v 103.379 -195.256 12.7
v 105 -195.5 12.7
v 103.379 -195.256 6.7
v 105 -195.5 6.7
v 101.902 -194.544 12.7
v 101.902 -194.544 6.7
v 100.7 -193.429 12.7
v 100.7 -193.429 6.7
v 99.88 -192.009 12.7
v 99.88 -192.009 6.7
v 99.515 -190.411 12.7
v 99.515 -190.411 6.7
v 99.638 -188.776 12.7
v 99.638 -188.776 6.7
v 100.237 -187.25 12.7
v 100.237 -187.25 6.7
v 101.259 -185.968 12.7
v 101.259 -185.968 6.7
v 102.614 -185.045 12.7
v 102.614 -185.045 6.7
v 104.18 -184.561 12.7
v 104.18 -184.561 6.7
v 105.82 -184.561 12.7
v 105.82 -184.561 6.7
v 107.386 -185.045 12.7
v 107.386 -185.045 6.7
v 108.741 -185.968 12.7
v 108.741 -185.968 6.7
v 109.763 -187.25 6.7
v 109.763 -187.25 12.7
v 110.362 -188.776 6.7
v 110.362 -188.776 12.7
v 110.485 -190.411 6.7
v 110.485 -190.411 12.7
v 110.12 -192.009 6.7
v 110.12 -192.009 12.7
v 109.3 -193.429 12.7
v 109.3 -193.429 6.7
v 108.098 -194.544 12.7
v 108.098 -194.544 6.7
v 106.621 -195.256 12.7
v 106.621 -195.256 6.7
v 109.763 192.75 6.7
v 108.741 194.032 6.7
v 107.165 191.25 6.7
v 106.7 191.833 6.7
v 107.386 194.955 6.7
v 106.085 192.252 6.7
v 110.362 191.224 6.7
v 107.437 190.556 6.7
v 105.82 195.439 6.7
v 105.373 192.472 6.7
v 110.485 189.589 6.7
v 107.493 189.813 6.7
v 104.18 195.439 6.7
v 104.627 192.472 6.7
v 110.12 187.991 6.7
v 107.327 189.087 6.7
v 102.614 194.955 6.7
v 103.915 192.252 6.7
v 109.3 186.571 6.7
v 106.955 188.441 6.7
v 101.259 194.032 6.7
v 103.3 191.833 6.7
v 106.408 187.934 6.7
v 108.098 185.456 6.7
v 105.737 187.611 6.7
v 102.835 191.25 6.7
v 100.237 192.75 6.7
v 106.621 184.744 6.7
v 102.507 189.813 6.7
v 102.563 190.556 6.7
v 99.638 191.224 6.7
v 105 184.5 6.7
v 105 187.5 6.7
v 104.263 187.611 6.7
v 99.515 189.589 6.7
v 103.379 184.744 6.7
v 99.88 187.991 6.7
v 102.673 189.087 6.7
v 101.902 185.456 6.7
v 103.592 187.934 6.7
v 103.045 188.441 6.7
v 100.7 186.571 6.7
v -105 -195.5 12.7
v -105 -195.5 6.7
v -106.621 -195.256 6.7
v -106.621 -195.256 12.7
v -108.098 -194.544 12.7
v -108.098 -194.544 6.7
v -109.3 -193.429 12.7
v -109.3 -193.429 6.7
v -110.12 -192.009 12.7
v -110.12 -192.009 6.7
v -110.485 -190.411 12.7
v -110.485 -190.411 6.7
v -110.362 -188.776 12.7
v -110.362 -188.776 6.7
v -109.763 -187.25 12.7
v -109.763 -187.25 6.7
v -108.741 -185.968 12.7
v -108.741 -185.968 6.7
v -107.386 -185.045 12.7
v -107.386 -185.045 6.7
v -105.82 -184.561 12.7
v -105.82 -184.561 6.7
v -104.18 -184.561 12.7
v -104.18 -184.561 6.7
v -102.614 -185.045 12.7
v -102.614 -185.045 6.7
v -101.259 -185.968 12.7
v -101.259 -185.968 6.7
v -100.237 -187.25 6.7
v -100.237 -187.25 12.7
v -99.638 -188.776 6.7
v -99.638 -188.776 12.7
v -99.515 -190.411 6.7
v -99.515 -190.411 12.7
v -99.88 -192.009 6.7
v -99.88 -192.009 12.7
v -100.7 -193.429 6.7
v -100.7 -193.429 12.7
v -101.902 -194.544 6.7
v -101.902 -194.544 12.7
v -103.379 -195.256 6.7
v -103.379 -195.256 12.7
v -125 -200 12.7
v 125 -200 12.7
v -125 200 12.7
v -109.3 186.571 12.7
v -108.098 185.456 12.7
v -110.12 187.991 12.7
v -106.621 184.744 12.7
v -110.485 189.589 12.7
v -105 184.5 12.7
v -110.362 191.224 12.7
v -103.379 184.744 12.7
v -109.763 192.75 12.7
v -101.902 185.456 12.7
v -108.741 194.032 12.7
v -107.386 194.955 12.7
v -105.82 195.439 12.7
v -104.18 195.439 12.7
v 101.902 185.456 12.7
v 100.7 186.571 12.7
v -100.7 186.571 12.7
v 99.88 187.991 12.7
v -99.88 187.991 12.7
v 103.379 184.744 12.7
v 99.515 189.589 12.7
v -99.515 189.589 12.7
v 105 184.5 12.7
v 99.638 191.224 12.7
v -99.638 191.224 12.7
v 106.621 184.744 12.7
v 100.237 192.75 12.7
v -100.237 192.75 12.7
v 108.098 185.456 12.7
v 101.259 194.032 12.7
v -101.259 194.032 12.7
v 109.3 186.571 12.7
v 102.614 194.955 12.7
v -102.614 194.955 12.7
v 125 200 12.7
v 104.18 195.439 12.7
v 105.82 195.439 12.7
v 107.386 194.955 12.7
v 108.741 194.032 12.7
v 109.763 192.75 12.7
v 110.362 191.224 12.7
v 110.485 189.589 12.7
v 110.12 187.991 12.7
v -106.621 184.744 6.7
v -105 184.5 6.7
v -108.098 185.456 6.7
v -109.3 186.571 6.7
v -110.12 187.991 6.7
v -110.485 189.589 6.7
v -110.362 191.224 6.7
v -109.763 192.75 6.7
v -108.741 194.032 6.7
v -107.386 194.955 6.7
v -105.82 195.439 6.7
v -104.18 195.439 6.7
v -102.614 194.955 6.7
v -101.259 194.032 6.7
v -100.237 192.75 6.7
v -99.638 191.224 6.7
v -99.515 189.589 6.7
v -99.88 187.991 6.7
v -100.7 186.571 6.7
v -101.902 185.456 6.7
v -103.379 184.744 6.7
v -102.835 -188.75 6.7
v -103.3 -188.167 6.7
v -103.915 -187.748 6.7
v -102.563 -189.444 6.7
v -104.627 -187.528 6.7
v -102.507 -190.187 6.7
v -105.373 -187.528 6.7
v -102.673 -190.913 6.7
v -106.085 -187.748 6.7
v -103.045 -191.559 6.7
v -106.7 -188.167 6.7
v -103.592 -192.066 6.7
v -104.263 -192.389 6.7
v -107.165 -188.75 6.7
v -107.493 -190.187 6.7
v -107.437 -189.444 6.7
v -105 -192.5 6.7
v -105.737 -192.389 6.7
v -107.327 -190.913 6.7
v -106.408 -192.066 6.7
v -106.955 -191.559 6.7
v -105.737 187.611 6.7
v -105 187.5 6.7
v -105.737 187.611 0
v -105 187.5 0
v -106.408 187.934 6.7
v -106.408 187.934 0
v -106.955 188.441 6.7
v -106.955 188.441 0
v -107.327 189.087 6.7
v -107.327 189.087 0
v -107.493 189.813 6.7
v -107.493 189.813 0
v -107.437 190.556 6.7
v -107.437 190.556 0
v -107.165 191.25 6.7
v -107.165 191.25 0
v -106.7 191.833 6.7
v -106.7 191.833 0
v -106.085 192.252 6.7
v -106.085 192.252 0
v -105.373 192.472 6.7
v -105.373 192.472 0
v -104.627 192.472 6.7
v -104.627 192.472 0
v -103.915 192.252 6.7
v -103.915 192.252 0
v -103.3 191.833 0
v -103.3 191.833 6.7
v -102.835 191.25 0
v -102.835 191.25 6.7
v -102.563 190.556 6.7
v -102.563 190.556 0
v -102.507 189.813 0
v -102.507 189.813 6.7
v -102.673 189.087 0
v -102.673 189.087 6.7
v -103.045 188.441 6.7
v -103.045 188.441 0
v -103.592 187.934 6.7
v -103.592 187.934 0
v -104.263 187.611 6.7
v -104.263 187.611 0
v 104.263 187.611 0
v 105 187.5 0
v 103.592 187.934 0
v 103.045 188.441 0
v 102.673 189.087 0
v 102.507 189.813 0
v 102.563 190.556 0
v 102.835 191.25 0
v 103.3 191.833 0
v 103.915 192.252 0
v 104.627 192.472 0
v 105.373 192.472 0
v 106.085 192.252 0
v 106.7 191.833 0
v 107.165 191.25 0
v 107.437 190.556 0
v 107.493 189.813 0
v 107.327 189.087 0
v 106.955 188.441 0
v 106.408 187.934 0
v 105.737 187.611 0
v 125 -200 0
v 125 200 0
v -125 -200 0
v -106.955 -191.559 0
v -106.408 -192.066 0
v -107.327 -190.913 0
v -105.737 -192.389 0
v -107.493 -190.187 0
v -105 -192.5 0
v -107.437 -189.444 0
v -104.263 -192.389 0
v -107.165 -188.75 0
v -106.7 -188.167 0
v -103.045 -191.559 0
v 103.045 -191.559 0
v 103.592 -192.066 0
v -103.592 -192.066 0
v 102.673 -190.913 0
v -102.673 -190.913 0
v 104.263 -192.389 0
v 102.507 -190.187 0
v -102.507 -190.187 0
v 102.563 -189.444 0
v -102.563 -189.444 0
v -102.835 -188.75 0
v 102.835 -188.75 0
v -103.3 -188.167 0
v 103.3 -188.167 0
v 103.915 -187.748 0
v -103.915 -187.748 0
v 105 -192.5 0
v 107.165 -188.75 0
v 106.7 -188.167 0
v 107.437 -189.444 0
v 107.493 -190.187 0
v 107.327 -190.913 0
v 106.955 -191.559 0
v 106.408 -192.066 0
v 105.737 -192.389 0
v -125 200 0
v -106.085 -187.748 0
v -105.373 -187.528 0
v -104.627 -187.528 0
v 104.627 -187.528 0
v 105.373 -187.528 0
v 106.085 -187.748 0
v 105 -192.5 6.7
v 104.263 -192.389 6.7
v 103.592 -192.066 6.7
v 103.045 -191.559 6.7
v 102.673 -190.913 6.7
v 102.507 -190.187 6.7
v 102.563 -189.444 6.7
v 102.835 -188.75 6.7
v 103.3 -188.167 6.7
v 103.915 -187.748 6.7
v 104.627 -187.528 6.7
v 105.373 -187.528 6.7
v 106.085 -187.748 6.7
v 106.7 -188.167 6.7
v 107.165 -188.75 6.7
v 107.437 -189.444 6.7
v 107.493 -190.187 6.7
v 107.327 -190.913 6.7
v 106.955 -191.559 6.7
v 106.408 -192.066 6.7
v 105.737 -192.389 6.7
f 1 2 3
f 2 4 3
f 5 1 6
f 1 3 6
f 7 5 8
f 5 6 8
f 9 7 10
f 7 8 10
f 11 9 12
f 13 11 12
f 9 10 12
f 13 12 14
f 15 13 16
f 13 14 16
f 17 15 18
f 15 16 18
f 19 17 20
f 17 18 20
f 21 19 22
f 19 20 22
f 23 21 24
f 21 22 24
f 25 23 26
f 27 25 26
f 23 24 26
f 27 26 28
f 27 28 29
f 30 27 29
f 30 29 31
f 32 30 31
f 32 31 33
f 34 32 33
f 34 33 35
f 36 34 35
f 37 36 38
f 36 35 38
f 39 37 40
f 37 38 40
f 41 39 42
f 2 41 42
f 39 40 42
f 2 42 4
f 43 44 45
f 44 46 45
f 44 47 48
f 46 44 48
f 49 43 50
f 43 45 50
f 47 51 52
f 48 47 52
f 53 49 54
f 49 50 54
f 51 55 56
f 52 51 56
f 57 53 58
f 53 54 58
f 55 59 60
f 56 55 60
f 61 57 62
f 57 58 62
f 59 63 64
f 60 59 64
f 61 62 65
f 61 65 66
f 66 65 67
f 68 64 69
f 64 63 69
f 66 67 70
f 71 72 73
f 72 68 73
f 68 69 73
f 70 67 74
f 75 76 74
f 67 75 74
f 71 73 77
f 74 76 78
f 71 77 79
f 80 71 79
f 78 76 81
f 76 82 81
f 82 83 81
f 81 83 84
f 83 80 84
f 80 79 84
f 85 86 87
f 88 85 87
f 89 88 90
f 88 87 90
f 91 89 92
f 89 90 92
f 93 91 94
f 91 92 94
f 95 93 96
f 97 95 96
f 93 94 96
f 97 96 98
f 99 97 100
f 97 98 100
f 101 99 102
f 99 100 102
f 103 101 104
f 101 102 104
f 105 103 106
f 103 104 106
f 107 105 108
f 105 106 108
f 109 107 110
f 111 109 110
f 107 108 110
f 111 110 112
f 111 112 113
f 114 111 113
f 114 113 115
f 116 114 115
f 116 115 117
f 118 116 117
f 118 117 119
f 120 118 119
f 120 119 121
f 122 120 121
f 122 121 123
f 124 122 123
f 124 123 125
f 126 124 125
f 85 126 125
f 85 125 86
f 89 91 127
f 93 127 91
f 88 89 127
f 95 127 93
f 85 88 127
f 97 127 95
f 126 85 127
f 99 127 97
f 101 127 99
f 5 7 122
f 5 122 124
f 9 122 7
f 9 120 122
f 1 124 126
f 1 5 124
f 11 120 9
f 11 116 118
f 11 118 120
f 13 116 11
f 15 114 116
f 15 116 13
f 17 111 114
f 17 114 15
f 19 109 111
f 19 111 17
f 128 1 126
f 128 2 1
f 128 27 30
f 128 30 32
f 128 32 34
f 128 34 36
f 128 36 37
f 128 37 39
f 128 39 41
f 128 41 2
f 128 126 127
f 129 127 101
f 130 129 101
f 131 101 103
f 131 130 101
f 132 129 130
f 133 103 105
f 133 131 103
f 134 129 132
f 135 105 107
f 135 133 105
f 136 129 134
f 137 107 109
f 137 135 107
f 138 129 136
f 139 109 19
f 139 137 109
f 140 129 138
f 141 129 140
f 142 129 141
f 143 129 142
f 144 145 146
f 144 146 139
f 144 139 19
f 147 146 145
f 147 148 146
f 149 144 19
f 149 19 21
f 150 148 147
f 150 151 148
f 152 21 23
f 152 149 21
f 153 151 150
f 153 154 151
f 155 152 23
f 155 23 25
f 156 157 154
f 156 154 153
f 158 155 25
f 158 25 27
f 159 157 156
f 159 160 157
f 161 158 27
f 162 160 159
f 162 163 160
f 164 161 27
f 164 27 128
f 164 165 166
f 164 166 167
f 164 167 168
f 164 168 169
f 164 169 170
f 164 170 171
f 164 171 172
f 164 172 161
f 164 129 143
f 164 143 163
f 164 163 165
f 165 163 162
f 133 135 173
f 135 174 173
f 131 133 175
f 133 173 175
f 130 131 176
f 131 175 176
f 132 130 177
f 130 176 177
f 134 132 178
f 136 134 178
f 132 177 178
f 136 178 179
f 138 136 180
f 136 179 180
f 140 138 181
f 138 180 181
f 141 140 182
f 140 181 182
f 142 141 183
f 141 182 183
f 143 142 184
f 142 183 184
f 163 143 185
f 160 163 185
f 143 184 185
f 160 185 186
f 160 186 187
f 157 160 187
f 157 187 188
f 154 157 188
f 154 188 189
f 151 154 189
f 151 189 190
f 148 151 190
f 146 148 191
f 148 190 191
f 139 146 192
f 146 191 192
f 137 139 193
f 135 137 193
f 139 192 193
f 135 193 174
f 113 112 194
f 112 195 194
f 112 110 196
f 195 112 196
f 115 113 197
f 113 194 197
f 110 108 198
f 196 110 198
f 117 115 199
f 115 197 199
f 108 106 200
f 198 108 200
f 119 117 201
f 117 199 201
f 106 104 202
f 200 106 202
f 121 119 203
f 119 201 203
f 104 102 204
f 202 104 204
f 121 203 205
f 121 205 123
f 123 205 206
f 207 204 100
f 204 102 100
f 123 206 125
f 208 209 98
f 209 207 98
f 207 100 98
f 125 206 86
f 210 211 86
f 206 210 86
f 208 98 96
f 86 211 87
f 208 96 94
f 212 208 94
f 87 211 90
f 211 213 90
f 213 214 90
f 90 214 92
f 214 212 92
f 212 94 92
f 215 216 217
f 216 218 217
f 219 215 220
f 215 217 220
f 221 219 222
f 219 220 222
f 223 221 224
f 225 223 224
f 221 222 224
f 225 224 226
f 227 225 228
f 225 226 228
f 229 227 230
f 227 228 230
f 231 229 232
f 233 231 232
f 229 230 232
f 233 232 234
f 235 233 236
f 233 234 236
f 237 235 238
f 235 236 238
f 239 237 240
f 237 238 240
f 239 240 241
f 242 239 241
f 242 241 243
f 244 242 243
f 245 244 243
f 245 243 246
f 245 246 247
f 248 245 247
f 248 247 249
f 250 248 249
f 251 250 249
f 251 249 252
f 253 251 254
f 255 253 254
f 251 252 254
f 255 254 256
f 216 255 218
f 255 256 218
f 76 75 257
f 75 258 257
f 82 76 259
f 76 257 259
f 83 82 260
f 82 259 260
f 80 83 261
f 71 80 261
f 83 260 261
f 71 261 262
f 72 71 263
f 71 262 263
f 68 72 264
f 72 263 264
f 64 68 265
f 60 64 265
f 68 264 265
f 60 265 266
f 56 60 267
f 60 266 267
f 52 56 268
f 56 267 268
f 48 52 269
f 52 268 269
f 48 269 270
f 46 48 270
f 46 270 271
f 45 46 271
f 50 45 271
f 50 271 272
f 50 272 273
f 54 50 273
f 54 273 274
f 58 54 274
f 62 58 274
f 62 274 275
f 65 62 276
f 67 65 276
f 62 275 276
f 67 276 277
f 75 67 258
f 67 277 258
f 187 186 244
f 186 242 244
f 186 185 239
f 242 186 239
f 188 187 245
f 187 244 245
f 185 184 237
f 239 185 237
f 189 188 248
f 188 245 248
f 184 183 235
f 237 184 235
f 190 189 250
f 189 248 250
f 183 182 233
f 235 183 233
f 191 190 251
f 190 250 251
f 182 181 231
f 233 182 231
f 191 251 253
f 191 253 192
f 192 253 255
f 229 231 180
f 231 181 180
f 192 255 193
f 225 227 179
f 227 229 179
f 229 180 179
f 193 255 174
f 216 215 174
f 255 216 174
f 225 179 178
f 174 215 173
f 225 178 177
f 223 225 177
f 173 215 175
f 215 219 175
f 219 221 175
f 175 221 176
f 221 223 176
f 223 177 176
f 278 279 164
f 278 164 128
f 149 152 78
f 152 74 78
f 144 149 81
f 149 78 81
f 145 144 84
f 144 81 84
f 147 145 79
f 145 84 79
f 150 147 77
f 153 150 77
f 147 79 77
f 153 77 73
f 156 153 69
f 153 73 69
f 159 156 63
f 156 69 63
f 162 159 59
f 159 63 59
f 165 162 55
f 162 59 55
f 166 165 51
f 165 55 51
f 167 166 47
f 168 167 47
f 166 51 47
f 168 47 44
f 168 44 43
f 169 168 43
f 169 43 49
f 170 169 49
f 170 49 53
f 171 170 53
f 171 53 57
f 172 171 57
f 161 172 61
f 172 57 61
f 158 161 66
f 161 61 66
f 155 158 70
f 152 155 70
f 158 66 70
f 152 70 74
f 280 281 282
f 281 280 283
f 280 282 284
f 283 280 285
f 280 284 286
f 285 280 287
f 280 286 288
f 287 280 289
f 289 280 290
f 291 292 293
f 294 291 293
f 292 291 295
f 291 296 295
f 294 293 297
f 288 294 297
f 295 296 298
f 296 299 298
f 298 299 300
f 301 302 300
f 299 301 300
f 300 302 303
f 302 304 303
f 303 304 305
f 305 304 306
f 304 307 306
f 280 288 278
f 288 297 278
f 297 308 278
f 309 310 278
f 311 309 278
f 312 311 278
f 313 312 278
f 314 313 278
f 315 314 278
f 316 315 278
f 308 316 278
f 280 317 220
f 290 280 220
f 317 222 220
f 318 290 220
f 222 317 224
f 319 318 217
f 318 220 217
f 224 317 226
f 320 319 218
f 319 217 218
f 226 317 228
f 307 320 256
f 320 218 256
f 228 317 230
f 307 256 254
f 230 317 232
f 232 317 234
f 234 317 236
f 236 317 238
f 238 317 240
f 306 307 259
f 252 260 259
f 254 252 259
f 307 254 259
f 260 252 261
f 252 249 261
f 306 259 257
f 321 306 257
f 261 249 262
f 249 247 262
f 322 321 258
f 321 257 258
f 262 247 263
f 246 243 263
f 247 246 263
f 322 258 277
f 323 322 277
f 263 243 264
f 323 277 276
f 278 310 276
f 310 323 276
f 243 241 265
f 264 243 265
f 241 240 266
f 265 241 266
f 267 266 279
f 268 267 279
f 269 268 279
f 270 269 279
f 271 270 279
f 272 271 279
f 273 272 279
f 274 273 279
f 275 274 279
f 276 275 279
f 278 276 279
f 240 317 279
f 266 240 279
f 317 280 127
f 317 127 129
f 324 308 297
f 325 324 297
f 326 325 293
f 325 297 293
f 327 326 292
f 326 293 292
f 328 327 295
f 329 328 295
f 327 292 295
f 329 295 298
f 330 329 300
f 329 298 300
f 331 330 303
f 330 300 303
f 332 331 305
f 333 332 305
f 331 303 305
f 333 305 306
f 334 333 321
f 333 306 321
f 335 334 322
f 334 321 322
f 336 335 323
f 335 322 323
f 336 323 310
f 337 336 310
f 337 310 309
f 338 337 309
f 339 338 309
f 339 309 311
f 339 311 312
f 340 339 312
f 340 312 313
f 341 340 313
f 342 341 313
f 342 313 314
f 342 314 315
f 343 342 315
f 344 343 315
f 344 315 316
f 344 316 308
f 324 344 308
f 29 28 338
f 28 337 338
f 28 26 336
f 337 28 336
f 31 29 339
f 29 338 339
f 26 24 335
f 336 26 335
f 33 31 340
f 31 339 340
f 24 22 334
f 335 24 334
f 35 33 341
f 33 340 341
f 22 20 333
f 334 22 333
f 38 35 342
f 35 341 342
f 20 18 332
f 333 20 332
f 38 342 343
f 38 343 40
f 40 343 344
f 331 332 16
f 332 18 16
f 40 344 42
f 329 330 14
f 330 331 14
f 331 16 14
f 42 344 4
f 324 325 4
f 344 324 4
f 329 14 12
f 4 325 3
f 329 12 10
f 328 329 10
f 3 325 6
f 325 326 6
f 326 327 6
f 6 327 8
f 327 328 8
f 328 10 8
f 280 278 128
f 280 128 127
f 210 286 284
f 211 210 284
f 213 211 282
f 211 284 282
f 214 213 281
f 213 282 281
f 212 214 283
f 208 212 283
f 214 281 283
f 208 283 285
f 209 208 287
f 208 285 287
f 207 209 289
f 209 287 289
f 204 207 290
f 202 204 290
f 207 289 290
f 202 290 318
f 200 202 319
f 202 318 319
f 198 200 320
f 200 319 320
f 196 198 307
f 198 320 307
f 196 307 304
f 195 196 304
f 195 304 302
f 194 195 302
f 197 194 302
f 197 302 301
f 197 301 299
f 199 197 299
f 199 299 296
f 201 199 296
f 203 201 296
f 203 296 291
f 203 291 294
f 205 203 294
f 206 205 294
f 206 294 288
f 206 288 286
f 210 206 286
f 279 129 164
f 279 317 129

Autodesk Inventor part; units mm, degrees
ref_plane "YZ Plane" through (0, 0, 0) normal (1, 0, 0) x (0, 1, 0)
ref_plane "XZ Plane" through (0, 0, 0) normal (0, 1, 0) x (-1, 0, 0)
ref_plane "XY Plane" through (0, 0, 0) normal (0, 0, 1) x (1, 0, 0)
sketch "Sketch1" plane through (0, 0, 0) normal (0, 0, 1) x (1, 0, 0)
  line L0 (-125, 200) -> (125, 200)
  line L1 (125, 200) -> (125, -200)
  line L2 (125, -200) -> (-125, -200)
  line L3 (-125, -200) -> (-125, 200)
  point P0 (0, 0)
  dimension "d0" = 250
  dimension "d1" = 400
  dimension "d2" = 125
  dimension "d3" = 200
extrude "Extrusion1" add sketch "Sketch1" along normal blind 12.7
sketch "Sketch2" plane through (0, 0, 12.7) normal (0, 0, 1) x (1, 0, 0)
  line L0 (-125, -200) -> (125, -200) projected
  line L1 (125, -200) -> (125, 200) projected
  circle A0 centre (105, -190) radius 2.75
  point P0 (0, 0)
  dimension "d6" = 5.5
  dimension "d7" = 10
  dimension "d8" = 20
hole "Hole1" at (105, -190, 12.7) direction (0, 0, -1) diameter 5 end through all counterbore diameter 11 counterbore depth 6
pattern_linear "Rectangular Pattern1" count 2 spacing 210 along (-1, 0, 0) count 2 spacing 380 along (0, 1, 0) of "Hole1"
equation "\"d2\" = 0.5 * d0"
equation "\"d3\" = 0.5 * d1"
properties part number "two_part_wastebaord" material "Wood (Walnut)"
